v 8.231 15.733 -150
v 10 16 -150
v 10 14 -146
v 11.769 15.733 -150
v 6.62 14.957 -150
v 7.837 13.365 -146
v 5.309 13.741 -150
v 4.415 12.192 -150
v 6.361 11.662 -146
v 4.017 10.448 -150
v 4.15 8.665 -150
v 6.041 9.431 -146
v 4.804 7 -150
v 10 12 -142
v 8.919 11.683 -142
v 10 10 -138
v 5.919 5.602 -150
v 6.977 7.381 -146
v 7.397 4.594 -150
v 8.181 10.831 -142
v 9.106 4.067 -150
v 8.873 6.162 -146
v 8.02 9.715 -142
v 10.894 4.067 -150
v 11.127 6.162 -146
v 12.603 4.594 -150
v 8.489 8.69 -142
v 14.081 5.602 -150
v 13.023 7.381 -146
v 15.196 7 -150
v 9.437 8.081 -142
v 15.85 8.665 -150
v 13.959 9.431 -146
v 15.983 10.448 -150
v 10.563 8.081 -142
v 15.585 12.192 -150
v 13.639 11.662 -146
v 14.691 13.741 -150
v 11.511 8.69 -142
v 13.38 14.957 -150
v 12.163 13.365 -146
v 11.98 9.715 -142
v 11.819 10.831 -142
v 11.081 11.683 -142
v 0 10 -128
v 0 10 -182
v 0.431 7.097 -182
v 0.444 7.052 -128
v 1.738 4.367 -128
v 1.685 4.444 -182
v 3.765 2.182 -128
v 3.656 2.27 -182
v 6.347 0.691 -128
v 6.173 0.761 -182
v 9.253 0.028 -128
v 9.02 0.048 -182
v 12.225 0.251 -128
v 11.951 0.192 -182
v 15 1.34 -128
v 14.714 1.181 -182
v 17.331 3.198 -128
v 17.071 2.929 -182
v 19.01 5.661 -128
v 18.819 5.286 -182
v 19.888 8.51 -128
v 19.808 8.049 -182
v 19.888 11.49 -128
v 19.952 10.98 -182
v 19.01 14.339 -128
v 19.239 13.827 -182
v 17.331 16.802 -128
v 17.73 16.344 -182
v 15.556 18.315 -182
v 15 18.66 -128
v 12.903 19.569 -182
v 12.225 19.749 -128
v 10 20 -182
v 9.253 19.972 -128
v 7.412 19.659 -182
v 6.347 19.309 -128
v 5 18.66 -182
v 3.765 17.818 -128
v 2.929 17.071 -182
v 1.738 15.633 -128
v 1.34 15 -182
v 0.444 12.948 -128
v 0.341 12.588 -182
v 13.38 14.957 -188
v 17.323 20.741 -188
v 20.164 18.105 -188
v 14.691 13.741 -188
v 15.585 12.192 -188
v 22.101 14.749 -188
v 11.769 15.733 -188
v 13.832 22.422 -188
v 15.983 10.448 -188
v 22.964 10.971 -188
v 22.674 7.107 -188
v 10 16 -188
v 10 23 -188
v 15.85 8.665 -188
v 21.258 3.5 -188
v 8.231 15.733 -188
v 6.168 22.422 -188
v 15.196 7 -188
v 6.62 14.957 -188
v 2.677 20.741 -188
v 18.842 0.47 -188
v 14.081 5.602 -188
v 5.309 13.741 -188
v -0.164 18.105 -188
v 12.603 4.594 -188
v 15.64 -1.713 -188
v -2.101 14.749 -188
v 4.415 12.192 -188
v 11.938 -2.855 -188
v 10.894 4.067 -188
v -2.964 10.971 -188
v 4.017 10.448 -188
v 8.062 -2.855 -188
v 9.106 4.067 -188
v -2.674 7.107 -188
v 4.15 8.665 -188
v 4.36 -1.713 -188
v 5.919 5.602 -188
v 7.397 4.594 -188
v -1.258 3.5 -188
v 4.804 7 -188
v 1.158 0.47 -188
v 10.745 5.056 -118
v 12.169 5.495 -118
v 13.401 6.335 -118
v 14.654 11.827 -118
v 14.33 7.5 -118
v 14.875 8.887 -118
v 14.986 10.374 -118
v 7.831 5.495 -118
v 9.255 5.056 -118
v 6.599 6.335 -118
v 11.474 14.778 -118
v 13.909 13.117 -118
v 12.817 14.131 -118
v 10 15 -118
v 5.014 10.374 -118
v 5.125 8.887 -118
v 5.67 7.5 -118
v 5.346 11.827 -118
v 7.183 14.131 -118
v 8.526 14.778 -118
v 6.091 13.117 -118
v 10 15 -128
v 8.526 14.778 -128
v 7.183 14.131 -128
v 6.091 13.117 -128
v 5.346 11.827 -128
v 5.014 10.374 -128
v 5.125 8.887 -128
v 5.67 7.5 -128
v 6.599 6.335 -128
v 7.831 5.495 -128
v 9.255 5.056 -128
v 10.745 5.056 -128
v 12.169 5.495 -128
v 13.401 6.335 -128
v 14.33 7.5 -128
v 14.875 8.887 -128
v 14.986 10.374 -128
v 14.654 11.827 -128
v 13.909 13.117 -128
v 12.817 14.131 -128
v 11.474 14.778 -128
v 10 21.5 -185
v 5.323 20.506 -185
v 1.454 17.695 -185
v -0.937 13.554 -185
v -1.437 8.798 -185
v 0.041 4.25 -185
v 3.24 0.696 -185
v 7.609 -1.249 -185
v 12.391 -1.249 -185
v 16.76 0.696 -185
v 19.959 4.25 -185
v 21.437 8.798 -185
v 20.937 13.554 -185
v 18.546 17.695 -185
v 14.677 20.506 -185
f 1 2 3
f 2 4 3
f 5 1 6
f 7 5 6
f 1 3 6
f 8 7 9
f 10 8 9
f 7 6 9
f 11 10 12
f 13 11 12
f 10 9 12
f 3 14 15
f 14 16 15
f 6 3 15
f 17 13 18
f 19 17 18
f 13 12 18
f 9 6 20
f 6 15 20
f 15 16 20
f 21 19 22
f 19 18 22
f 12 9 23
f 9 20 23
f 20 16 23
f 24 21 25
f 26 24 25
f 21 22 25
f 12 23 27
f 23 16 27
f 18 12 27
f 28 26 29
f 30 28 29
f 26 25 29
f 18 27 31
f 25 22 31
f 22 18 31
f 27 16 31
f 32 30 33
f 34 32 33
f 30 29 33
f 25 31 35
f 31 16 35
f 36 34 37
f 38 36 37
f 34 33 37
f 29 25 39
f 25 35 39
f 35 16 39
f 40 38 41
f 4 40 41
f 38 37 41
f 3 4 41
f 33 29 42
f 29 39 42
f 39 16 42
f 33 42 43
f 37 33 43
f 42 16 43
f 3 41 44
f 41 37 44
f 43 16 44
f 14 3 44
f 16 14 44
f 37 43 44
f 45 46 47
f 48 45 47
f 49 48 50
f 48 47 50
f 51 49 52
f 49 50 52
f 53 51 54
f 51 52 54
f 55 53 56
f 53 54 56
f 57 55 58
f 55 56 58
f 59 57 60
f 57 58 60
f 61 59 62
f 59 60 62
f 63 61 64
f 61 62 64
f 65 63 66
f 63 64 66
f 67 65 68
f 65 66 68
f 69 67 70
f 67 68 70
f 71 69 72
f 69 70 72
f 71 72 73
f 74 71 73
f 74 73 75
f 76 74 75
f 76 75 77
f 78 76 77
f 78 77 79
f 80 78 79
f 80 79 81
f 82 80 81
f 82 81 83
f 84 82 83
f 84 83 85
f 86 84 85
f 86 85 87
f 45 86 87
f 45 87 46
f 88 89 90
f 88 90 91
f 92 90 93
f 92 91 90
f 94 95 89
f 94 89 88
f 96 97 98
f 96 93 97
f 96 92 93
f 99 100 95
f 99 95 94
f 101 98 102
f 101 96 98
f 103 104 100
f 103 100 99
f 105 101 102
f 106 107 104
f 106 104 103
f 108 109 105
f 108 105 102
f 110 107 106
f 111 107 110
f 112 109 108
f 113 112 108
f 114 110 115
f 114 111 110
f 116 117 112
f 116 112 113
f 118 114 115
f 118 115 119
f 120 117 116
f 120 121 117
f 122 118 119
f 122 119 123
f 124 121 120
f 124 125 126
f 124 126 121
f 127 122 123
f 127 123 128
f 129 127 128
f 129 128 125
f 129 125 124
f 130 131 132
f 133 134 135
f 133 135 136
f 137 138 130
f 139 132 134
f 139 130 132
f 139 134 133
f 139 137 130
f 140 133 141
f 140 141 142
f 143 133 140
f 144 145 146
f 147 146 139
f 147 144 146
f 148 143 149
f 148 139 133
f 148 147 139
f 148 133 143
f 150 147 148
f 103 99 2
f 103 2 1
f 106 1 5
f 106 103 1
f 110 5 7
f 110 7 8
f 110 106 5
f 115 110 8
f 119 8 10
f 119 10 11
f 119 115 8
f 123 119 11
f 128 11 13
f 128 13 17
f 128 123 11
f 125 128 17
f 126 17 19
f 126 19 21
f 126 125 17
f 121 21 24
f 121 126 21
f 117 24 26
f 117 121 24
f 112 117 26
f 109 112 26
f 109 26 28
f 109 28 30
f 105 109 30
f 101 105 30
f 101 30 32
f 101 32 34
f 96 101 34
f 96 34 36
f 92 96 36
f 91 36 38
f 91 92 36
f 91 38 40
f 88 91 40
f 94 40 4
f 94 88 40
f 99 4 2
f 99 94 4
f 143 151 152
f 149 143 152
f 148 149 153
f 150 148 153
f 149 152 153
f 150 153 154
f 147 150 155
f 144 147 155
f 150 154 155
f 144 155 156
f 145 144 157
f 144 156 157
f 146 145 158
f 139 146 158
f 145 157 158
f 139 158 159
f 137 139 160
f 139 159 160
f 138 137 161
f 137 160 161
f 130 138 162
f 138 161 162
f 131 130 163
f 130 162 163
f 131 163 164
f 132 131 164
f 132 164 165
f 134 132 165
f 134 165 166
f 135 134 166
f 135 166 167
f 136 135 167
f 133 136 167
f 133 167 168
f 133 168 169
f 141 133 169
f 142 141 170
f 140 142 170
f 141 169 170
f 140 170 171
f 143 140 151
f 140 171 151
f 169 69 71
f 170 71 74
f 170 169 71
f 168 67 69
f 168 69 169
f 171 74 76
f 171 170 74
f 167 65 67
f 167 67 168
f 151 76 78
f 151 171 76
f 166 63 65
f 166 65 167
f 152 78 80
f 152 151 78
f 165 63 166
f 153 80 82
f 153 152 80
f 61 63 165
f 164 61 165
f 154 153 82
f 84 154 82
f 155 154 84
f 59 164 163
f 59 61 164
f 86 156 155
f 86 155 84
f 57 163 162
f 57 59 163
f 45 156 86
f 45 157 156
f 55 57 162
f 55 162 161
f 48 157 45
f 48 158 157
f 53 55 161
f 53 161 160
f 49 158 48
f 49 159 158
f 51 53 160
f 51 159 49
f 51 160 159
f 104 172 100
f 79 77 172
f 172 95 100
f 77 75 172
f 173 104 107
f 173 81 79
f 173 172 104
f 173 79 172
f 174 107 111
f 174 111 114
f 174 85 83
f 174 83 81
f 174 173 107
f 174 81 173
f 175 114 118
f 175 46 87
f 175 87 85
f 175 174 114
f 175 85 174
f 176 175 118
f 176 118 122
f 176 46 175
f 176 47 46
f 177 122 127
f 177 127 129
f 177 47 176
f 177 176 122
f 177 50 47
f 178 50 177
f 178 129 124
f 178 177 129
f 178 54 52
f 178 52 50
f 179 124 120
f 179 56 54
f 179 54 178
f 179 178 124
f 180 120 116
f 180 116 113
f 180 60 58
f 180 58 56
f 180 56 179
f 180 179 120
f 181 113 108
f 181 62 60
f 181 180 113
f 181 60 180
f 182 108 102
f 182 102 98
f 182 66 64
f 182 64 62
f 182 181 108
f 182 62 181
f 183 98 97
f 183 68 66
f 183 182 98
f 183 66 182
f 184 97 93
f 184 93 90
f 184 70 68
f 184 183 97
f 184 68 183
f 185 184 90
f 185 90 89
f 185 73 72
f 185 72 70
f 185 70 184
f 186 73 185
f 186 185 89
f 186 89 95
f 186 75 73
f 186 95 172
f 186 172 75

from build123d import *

# Parameters (mm, degrees)
CYLINDER_R              = 10
CYLINDER_DEPTH          = 60
CYLINDER001_R           = 5
CYLINDER001_DEPTH       = 10
CYLINDER002_R           = 6
CYLINDER002_DEPTH       = 38
BODY002_PLACEMENT_ANGLE = 90


with BuildPart() as part:
    # Cylinder → Cylinder (join)
    with BuildSketch(Plane(origin=(10, 0, -127), x_dir=(0, 1, 0), z_dir=(0, 0, 1))):
        Circle(CYLINDER_R)
    extrude(amount=CYLINDER_DEPTH)

    # Cone003 → Cone003 (revolve)
    with BuildSketch(Plane(origin=(10, 0, -127), x_dir=(1, 0, 0), z_dir=(0, -1, 0))):
        Polygon((0, 0), (13, 0), (0, 26), align=None)
    revolve(axis=Axis((10, 0, -127), (0, 0, 1)))

    # Cylinder001 → Cylinder001 (join)
    with BuildSketch(Plane(origin=(10, 0, -67), x_dir=(1, 0, 0), z_dir=(0, 0, 1))):
        Circle(CYLINDER001_R)
    extrude(amount=CYLINDER001_DEPTH)

    # Cylinder002 → Cylinder002 (cut)
    with BuildSketch(Plane(origin=(10, 0, -127), x_dir=(1, 0, 0), z_dir=(0, 0, 1))):
        Circle(CYLINDER002_R)
    extrude(amount=CYLINDER002_DEPTH, mode=Mode.SUBTRACT)

    # Cone → Cone (revolve, cut)
    with BuildSketch(Plane(origin=(10, 0, -89), x_dir=(1, 0, 0), z_dir=(0, -1, 0))):
        Polygon((0, 0), (6, 0), (0, 12), align=None)
    revolve(axis=Axis((10, 0, -89), (0, 0, 1)), mode=Mode.SUBTRACT)


with BuildPart() as part_1:
    # Body002 placement: moved
    add(part.part.moved(Location((10, 0, -61))).rotate(Axis((10, 0, -61), (0, 0, 1)), BODY002_PLACEMENT_ANGLE))


solid = part_1.part
